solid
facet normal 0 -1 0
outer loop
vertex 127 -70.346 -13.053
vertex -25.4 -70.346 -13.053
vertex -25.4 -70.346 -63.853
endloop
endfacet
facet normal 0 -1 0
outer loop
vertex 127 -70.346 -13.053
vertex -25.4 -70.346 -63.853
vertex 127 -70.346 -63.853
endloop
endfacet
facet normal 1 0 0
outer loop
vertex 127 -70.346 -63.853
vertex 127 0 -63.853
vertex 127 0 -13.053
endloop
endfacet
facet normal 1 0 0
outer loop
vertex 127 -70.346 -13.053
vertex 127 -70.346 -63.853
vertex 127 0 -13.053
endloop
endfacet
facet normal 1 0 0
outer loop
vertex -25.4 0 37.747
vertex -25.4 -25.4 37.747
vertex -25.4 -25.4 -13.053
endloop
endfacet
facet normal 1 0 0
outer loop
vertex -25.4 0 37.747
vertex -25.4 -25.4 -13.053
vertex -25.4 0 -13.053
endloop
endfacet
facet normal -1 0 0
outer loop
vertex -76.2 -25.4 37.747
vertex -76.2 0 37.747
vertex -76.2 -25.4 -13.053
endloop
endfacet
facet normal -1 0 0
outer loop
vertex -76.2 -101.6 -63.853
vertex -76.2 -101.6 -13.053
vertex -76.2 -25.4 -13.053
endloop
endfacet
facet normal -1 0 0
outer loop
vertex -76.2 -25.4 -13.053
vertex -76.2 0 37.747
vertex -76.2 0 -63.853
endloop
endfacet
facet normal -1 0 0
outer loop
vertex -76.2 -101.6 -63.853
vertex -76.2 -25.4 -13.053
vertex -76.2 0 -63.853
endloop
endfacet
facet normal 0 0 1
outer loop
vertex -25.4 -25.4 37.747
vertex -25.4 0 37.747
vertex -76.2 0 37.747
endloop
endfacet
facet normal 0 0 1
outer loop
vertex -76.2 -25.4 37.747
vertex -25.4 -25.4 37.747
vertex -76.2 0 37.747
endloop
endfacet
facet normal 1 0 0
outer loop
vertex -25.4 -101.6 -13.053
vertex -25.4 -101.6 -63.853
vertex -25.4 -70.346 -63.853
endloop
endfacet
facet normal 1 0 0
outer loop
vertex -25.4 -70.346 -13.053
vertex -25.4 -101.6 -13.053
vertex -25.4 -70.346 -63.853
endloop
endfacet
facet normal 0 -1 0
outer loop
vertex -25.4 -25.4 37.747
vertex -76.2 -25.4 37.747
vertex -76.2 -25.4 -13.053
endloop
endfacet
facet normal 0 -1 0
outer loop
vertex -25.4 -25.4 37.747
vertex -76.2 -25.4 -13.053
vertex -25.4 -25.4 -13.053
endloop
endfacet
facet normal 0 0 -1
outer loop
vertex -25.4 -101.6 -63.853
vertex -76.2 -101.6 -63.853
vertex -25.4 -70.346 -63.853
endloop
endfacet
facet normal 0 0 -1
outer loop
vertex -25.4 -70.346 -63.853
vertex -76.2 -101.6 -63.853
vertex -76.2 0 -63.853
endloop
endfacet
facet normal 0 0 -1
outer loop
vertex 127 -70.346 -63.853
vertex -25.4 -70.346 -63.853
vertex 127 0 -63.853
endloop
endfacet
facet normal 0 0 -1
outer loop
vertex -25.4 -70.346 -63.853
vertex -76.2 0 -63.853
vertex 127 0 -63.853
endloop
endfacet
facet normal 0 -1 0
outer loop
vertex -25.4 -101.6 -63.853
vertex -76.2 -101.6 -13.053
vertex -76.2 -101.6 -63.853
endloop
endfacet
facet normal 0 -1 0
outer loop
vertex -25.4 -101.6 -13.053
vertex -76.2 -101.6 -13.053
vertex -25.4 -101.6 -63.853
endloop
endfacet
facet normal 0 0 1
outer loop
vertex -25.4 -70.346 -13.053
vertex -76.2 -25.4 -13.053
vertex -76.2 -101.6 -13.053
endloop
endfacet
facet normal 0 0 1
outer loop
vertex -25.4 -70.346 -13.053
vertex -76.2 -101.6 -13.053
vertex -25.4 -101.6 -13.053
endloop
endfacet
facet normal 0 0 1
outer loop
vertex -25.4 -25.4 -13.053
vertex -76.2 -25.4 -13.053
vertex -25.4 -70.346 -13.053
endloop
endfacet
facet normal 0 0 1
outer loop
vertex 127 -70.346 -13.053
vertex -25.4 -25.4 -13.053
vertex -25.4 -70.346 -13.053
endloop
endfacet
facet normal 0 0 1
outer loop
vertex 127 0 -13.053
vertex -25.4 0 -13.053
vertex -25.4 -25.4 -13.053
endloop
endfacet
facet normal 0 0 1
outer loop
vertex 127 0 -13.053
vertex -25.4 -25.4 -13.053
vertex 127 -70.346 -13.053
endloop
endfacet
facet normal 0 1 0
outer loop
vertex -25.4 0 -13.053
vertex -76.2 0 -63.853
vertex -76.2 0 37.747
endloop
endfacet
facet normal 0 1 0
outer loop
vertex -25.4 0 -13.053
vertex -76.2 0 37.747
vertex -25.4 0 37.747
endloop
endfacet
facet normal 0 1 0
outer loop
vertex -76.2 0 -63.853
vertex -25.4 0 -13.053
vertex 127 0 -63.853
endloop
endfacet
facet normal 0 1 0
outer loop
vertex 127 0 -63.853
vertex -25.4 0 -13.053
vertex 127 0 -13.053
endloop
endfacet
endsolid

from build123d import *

# Parameters (mm, degrees)
F1_DEPTH = 101.6
F2_W     = 25.4
F2_H     = 101.6
F3_DEPTH = 50.8
F4_W     = 152.4
F4_H     = 31.2542108059
F5_DEPTH = 50.8
F6_W     = 50.8
F6_H     = 76.2
F7_DEPTH = 50.8


with BuildPart() as f1:
    # F0 (on Front) → F1 (new body)
    with BuildSketch(Plane.XZ):
        Polygon((0, 37.7466529608), (-76.2, 37.7466529608), (-76.2, -63.8533470392), (127, -63.8533470392), (127, -13.0533470392), (0, -13.0533470392), align=None)
    extrude(amount=F1_DEPTH)

    # F2 (on face) → F3 (cut)
    with BuildSketch(Plane.XY.offset(-13.0533470392)):
        with Locations((-12.7, -50.8)):
            Rectangle(F2_W, F2_H)
    extrude(amount=F3_DEPTH, mode=Mode.SUBTRACT)

    # F4 (on face) → F5 (cut)
    with BuildSketch(Plane.XY.offset(-13.0533470392)):
        with Locations((50.8, -85.9728945971)):
            Rectangle(F4_W, F4_H)
    extrude(amount=-F5_DEPTH, mode=Mode.SUBTRACT)

    # F6 (on face) → F7 (cut)
    with BuildSketch(Plane.XY.offset(37.7466529608)):
        with Locations((-50.8, -63.5)):
            Rectangle(F6_W, F6_H)
    extrude(amount=-F7_DEPTH, mode=Mode.SUBTRACT)


solid = f1.part
